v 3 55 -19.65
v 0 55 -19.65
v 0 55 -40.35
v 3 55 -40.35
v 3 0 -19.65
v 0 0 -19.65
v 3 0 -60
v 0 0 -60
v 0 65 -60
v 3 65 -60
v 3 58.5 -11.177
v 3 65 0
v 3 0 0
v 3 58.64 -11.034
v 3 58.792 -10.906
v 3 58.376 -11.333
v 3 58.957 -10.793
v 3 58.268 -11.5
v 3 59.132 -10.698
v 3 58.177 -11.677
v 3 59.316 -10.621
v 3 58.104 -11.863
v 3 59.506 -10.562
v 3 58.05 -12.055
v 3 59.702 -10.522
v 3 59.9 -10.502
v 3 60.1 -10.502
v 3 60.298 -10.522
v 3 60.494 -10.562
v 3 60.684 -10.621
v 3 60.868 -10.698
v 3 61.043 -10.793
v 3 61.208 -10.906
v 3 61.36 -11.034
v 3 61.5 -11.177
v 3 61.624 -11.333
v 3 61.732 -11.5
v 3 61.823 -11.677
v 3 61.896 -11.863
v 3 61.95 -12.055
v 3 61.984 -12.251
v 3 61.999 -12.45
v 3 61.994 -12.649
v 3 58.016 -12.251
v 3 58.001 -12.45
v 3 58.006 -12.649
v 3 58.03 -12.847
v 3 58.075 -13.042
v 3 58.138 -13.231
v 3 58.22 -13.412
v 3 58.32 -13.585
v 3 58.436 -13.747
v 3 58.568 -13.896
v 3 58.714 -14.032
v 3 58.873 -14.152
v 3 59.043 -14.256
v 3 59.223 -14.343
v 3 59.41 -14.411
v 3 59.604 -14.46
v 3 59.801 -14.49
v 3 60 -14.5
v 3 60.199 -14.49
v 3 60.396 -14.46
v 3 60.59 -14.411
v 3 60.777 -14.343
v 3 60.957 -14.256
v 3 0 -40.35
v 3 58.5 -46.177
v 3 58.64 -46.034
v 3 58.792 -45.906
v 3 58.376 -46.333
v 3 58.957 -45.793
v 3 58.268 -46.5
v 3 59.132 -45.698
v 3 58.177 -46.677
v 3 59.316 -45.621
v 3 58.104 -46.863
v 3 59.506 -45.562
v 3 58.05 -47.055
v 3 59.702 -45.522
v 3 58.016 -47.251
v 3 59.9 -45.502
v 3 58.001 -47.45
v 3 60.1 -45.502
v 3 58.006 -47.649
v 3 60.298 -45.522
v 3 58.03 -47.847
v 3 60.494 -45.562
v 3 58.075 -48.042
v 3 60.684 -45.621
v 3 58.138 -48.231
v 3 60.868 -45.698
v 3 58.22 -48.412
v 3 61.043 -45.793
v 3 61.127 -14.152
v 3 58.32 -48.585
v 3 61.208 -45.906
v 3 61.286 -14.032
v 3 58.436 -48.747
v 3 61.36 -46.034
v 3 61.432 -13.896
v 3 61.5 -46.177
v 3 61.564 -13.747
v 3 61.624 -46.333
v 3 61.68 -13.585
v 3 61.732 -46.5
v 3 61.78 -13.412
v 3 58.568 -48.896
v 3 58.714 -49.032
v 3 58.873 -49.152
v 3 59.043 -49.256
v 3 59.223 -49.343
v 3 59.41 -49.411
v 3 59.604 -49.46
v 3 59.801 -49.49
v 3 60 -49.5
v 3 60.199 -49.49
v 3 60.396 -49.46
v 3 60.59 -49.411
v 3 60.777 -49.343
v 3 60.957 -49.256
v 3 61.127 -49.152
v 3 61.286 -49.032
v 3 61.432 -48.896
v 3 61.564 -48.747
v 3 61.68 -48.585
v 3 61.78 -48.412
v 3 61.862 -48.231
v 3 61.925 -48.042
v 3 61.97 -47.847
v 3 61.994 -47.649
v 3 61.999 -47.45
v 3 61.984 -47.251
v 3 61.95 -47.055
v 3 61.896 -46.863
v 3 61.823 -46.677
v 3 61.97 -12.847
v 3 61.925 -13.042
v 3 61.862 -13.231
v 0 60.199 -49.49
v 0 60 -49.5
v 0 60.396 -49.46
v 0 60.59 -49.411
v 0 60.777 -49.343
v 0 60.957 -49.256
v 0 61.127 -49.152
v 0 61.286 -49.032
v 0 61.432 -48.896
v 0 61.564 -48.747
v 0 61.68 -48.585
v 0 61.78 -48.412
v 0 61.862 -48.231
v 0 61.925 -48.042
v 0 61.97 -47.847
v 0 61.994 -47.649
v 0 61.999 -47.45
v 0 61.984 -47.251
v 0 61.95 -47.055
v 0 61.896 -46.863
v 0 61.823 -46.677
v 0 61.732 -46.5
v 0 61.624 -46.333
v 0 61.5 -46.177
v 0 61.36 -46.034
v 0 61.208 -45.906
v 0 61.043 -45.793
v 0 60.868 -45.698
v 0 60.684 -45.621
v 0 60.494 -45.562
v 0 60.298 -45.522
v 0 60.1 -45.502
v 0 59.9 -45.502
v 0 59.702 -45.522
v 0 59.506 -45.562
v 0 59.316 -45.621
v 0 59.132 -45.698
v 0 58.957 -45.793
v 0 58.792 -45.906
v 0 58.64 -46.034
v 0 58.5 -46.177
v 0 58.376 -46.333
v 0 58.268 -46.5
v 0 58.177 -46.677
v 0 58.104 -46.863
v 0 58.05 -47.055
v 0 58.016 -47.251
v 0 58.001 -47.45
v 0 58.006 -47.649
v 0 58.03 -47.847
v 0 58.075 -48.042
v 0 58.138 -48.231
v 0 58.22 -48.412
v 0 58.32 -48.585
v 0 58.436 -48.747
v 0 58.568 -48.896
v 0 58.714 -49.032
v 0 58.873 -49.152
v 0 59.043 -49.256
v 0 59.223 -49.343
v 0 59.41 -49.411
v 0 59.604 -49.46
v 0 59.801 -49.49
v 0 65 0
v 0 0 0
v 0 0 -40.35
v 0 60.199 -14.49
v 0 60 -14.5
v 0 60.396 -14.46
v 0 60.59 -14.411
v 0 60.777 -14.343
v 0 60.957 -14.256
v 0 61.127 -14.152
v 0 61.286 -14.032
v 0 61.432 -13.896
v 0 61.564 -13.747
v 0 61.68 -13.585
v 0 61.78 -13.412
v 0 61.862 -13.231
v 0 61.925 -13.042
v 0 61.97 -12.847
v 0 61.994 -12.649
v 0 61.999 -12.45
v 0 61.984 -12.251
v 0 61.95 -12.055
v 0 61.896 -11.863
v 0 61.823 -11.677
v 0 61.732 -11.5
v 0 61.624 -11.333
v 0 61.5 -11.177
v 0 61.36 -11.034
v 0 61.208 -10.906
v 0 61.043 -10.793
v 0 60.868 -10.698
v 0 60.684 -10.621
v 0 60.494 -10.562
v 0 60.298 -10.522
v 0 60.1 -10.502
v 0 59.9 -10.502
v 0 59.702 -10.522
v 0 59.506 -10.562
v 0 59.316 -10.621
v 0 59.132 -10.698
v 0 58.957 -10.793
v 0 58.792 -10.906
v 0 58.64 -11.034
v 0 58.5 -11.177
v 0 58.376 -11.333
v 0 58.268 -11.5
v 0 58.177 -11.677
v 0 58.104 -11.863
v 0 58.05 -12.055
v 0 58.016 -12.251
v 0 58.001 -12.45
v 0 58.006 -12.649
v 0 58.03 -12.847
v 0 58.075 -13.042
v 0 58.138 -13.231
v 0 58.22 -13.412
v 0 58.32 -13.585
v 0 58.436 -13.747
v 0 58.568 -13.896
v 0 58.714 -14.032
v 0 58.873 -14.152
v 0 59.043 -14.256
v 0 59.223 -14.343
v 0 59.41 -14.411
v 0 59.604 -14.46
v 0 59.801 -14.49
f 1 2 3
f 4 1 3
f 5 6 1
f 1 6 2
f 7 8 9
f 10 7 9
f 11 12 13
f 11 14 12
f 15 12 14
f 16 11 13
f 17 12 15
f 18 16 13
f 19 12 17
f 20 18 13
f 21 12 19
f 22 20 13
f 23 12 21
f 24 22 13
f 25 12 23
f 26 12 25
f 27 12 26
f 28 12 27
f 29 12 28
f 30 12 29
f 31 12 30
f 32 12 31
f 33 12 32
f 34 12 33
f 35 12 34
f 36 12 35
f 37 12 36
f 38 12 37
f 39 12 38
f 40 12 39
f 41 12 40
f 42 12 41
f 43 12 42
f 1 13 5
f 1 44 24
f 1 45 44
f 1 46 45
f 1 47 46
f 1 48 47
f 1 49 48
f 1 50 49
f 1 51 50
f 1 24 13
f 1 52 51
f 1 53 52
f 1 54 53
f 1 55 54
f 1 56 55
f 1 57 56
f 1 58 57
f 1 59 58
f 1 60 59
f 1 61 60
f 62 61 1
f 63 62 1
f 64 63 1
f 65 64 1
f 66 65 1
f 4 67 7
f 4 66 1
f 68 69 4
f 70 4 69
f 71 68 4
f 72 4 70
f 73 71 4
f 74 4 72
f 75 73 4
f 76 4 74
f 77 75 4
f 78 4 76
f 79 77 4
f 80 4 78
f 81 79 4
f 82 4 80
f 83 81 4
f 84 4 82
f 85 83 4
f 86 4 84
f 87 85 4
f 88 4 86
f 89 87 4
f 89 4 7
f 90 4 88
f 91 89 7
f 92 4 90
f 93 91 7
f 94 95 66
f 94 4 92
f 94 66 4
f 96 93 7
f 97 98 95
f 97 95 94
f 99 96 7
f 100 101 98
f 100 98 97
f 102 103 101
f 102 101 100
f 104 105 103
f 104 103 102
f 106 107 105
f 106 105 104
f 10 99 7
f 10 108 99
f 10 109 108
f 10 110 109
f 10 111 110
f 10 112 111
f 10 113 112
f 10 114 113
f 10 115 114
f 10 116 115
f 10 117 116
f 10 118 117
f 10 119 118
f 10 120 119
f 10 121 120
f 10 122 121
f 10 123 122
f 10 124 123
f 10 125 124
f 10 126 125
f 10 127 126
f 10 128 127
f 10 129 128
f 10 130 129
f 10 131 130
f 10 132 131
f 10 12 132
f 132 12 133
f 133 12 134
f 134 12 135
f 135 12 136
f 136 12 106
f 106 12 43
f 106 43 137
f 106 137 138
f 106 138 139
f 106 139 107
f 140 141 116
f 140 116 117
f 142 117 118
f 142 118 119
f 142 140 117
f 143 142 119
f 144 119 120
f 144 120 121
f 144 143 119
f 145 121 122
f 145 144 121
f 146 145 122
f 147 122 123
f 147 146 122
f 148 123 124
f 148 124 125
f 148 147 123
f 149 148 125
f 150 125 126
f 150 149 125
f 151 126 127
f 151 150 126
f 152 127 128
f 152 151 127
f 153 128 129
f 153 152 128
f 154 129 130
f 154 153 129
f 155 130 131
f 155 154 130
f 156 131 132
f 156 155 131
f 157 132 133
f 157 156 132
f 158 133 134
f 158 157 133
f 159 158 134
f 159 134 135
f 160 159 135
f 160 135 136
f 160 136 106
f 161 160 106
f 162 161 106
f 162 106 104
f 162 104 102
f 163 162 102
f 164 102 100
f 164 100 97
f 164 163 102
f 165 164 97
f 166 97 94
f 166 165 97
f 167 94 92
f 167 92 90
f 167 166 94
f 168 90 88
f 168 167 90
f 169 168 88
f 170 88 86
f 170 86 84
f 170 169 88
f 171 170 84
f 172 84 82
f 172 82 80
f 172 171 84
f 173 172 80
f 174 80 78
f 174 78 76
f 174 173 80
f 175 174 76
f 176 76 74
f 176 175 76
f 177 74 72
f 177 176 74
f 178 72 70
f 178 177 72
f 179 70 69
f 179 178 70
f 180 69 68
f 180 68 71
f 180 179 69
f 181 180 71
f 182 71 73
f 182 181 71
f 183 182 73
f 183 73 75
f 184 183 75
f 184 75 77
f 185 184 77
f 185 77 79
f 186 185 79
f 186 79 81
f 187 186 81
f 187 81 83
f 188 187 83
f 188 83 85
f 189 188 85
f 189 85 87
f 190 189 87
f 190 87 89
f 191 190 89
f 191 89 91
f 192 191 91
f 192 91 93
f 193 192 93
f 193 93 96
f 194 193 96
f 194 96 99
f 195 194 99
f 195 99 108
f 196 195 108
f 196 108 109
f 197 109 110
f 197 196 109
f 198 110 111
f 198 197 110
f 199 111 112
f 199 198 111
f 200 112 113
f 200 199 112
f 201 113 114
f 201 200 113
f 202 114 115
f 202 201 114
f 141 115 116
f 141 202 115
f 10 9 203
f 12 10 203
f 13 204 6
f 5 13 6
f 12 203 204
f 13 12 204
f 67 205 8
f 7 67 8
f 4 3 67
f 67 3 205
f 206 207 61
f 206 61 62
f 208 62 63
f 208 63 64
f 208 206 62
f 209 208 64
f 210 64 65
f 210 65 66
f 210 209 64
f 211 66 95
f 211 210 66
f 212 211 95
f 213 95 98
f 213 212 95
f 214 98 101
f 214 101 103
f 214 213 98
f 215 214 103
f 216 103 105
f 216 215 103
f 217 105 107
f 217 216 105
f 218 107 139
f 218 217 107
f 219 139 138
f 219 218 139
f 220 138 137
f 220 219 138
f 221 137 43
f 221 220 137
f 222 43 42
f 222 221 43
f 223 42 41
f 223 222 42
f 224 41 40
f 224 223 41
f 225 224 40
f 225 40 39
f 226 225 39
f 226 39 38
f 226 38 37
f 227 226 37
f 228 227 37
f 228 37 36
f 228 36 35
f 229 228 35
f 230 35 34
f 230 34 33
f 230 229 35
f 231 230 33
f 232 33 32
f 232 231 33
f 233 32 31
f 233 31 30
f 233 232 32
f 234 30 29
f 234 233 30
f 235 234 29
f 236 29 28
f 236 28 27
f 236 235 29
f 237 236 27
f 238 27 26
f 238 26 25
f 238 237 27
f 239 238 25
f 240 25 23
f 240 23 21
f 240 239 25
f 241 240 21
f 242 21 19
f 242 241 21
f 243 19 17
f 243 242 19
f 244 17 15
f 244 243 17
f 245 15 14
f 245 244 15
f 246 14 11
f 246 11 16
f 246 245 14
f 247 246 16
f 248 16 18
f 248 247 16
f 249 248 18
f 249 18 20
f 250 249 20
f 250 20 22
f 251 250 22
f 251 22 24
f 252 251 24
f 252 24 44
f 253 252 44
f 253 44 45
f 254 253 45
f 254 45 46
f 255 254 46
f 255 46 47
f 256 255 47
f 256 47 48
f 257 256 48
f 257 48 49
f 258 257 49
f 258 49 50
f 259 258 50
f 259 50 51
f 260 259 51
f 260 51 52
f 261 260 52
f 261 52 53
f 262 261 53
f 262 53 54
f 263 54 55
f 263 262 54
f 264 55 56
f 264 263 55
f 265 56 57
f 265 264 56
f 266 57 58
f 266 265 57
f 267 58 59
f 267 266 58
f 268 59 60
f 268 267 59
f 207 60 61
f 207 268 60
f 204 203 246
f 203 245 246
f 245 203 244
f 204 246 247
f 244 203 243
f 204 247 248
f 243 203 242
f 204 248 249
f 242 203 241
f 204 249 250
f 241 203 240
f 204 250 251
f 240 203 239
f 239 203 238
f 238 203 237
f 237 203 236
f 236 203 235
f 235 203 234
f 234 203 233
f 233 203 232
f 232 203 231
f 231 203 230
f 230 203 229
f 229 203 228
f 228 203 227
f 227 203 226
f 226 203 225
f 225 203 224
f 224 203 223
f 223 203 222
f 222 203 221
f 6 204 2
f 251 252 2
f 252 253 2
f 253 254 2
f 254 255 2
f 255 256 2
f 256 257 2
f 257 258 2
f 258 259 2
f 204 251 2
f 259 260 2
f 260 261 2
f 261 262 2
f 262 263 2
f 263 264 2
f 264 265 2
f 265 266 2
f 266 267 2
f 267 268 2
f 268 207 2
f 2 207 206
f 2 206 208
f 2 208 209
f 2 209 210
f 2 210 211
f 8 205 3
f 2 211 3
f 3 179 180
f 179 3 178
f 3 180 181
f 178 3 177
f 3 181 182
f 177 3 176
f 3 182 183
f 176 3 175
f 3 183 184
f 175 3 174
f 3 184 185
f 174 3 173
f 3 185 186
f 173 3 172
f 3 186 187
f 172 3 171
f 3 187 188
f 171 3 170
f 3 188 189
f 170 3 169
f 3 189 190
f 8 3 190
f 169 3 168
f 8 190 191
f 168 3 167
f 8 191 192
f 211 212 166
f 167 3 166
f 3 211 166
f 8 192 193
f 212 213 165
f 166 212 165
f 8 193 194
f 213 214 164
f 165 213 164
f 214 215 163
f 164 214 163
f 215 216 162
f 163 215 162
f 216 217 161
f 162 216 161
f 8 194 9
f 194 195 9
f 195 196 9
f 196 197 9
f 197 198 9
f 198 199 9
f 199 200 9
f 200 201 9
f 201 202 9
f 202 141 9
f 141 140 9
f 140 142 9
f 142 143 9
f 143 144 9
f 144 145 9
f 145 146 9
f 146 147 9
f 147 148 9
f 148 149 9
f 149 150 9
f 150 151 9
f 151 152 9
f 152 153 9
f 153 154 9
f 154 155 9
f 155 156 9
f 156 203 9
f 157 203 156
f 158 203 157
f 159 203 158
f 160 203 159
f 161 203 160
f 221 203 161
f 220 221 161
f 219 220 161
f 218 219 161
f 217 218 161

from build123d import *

# Parameters (mm, degrees)
SKETCH2_R           = 2
BOSS_EXTRUDE1_DEPTH = 3


with BuildPart() as part:
    # Sketch2 → Boss-Extrude1 (new body)
    with BuildSketch(Plane(origin=(0, 0, 0), x_dir=(0, 0, -1), z_dir=(1, 0, 0))):
        Polygon((60, 65), (0, 65), (0, 0), (19.65, 0), (19.65, 55), (40.35, 55), (40.35, 0), (60, 0), align=None)
        with Locations((12.5, 60)):
            Circle(SKETCH2_R, mode=Mode.SUBTRACT)
        with Locations((47.5, 60)):
            Circle(SKETCH2_R, mode=Mode.SUBTRACT)
    extrude(amount=BOSS_EXTRUDE1_DEPTH)


solid = part.part
